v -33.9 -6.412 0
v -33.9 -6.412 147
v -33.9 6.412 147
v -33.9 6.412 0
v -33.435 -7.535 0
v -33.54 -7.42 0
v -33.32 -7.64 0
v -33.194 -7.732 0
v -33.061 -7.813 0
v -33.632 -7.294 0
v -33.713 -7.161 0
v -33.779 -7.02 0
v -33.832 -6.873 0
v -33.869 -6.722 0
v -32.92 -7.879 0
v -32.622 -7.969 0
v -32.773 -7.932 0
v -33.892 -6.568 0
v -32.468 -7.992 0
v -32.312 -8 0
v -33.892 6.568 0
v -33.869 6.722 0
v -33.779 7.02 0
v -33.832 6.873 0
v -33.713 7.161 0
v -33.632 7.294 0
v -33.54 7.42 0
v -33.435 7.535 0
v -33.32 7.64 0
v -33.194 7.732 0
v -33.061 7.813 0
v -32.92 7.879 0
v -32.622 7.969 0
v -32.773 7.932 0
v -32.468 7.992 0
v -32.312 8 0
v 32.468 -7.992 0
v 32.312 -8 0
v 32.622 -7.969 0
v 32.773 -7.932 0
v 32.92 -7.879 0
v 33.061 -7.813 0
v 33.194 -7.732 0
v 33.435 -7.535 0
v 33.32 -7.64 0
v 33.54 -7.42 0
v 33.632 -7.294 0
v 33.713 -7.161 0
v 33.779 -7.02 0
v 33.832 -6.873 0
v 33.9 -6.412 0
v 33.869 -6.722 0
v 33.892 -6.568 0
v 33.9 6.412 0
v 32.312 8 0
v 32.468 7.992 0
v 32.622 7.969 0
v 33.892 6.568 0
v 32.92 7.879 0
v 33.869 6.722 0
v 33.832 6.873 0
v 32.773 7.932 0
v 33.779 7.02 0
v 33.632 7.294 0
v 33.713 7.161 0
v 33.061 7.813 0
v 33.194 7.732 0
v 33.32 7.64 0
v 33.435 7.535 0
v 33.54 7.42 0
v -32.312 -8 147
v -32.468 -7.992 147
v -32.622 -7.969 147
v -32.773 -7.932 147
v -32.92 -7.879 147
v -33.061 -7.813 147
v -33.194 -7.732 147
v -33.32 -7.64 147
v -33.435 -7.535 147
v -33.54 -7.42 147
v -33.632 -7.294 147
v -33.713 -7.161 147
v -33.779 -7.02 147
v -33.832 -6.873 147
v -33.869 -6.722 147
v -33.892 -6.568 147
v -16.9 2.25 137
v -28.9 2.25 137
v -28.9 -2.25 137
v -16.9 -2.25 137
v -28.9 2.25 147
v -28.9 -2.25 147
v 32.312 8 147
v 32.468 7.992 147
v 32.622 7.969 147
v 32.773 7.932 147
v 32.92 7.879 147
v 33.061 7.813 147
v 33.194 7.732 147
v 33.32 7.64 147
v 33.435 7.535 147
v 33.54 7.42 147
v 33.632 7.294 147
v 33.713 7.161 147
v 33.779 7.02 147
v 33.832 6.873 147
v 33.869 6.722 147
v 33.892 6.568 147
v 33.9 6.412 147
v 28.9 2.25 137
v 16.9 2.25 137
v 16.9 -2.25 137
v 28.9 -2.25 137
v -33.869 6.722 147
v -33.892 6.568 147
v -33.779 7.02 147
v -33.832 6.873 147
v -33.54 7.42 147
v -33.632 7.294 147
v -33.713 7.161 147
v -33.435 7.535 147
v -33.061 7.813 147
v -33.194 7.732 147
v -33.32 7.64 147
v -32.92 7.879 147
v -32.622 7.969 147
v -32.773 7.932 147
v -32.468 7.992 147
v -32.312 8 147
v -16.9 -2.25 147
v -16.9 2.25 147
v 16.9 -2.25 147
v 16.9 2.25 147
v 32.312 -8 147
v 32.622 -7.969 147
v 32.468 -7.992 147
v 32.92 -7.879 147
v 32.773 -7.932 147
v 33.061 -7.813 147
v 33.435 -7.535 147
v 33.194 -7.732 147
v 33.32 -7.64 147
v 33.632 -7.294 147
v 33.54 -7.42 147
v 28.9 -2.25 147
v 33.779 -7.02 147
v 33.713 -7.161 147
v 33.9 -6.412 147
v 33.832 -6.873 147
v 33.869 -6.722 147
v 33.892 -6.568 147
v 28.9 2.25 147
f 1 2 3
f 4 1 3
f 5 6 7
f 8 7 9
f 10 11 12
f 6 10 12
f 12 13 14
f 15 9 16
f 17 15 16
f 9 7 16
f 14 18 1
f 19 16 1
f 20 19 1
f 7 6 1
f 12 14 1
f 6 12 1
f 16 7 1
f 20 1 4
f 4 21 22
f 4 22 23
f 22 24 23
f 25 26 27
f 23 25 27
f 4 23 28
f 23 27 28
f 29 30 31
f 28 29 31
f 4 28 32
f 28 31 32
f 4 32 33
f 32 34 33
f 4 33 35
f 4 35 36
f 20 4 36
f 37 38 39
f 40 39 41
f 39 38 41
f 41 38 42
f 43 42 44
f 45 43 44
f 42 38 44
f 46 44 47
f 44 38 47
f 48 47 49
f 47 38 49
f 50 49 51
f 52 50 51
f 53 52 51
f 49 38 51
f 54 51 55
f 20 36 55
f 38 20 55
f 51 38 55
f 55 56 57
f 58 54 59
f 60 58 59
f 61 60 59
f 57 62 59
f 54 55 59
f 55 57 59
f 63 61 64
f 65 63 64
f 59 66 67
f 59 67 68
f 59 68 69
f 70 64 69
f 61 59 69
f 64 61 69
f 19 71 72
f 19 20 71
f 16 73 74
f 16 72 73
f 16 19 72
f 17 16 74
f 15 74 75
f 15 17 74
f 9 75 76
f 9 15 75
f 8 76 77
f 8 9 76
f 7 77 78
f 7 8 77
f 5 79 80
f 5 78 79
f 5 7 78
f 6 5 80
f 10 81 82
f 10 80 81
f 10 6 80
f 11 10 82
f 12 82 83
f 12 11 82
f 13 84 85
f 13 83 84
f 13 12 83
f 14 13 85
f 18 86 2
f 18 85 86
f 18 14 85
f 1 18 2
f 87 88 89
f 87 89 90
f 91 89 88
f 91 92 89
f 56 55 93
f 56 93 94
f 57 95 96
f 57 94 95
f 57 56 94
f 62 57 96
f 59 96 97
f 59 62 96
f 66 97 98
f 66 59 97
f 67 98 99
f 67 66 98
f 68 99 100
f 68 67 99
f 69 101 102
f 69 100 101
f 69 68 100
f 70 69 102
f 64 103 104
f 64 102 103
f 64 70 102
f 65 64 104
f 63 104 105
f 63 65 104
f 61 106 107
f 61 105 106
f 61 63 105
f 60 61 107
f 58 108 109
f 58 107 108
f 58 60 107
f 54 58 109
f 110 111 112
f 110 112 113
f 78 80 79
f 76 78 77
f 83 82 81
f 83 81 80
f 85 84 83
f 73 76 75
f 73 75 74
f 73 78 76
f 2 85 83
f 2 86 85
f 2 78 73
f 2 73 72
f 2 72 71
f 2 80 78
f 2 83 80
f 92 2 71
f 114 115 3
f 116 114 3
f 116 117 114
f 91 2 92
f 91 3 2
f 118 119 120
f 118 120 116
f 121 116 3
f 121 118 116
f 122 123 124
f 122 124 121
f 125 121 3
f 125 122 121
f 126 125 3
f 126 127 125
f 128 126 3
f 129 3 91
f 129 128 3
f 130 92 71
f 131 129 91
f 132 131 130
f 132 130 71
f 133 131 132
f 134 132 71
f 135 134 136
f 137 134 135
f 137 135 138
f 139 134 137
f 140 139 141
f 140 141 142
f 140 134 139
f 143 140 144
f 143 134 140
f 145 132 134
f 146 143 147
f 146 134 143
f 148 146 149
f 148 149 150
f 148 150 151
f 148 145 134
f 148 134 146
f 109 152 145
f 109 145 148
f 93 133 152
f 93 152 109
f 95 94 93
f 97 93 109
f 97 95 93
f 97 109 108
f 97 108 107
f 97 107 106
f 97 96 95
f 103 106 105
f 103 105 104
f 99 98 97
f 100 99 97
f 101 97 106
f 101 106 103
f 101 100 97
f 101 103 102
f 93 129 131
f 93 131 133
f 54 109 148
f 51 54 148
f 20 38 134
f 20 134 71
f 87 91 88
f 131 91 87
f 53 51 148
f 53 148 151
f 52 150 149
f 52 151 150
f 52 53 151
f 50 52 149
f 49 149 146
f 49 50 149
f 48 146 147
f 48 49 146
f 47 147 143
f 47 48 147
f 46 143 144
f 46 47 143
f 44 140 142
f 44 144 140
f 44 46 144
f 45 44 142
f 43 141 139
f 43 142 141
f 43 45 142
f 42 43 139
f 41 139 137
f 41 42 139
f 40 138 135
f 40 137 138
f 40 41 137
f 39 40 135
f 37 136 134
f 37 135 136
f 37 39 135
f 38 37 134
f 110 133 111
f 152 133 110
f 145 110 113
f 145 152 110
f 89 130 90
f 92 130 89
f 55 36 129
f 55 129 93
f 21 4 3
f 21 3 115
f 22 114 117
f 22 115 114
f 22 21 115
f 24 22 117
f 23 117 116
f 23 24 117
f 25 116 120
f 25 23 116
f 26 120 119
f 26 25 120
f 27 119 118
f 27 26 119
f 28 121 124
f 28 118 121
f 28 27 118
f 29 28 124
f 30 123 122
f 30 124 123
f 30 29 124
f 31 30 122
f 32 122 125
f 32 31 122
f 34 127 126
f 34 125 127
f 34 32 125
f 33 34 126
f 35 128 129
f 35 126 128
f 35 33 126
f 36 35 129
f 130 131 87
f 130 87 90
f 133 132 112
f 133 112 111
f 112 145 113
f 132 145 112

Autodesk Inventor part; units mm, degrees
ref_plane "YZ Plane" through (0, 0, 0) normal (1, 0, 0) x (0, 1, 0)
ref_plane "XZ Plane" through (0, 0, 0) normal (0, 1, 0) x (-1, 0, 0)
ref_plane "XY Plane" through (0, 0, 0) normal (0, 0, 1) x (1, 0, 0)
sketch "Sketch1" plane through (0, 0, 0) normal (0, 0, 1) x (1, 0, 0)
  line L0 (-32.3125, 8) -> (32.3125, 8)
  line L1 (33.9, 6.4125) -> (33.9, -6.4125)
  line L2 (32.3125, -8) -> (-32.3125, -8)
  line L3 (-33.9, -6.4125) -> (-33.9, 6.4125)
  arc A0 (-32.3125, 8) -> (-33.9, 6.4125) centre (-32.3125, 6.4125) ccw
  arc A1 (33.9, 6.4125) -> (32.3125, 8) centre (32.3125, 6.4125) ccw
  arc A2 (32.3125, -8) -> (33.9, -6.4125) centre (32.3125, -6.4125) ccw
  arc A3 (-33.9, -6.4125) -> (-32.3125, -8) centre (-32.3125, -6.4125) ccw
  dimension "d2" = 1.5875
extrude "Extrusion1" add sketch "Sketch1" along normal blind 147
sketch "Sketch2" plane through (0, 0, 147) normal (0, 0, 1) x (1, 0, 0)
  line L0 (-28.9, 2.25) -> (-16.9, 2.25)
  line L1 (-16.9, 2.25) -> (-16.9, -2.25)
  line L2 (-16.9, -2.25) -> (-28.9, -2.25)
  line L3 (-28.9, -2.25) -> (-28.9, 2.25)
  line L4 (-28.9, 2.25) -> (-16.9, -2.25) construction
  line L5 (-16.9, 2.25) -> (-28.9, -2.25) construction
  line L6 (16.9, 2.25) -> (28.9, 2.25)
  line L7 (28.9, 2.25) -> (28.9, -2.25)
  line L8 (28.9, -2.25) -> (16.9, -2.25)
  line L9 (16.9, -2.25) -> (16.9, 2.25)
  line L10 (16.9, 2.25) -> (28.9, -2.25) construction
  line L11 (28.9, 2.25) -> (16.9, -2.25) construction
  line L12 (-33.9, 6.4125) -> (-33.9, -6.4125) construction
  line L13 (-33.9, 0) -> (33.9, 0) construction
  line L14 (33.9, -6.4125) -> (33.9, 6.4125) construction
  point P0 (0, 0)
  point P1 (-22.9, 0)
  point P2 (22.9, 0)
  dimension "d11" = 12
  dimension "d12" = 12
  dimension "d13" = 4.5
  dimension "d14" = 4.5
  dimension "d15" = 5
  dimension "d16" = 5
extrude "Extrusion2" cut sketch "Sketch2" against normal blind 10
equation "\"d16\" = d15"
properties part number "5V_LIon_speedy"
